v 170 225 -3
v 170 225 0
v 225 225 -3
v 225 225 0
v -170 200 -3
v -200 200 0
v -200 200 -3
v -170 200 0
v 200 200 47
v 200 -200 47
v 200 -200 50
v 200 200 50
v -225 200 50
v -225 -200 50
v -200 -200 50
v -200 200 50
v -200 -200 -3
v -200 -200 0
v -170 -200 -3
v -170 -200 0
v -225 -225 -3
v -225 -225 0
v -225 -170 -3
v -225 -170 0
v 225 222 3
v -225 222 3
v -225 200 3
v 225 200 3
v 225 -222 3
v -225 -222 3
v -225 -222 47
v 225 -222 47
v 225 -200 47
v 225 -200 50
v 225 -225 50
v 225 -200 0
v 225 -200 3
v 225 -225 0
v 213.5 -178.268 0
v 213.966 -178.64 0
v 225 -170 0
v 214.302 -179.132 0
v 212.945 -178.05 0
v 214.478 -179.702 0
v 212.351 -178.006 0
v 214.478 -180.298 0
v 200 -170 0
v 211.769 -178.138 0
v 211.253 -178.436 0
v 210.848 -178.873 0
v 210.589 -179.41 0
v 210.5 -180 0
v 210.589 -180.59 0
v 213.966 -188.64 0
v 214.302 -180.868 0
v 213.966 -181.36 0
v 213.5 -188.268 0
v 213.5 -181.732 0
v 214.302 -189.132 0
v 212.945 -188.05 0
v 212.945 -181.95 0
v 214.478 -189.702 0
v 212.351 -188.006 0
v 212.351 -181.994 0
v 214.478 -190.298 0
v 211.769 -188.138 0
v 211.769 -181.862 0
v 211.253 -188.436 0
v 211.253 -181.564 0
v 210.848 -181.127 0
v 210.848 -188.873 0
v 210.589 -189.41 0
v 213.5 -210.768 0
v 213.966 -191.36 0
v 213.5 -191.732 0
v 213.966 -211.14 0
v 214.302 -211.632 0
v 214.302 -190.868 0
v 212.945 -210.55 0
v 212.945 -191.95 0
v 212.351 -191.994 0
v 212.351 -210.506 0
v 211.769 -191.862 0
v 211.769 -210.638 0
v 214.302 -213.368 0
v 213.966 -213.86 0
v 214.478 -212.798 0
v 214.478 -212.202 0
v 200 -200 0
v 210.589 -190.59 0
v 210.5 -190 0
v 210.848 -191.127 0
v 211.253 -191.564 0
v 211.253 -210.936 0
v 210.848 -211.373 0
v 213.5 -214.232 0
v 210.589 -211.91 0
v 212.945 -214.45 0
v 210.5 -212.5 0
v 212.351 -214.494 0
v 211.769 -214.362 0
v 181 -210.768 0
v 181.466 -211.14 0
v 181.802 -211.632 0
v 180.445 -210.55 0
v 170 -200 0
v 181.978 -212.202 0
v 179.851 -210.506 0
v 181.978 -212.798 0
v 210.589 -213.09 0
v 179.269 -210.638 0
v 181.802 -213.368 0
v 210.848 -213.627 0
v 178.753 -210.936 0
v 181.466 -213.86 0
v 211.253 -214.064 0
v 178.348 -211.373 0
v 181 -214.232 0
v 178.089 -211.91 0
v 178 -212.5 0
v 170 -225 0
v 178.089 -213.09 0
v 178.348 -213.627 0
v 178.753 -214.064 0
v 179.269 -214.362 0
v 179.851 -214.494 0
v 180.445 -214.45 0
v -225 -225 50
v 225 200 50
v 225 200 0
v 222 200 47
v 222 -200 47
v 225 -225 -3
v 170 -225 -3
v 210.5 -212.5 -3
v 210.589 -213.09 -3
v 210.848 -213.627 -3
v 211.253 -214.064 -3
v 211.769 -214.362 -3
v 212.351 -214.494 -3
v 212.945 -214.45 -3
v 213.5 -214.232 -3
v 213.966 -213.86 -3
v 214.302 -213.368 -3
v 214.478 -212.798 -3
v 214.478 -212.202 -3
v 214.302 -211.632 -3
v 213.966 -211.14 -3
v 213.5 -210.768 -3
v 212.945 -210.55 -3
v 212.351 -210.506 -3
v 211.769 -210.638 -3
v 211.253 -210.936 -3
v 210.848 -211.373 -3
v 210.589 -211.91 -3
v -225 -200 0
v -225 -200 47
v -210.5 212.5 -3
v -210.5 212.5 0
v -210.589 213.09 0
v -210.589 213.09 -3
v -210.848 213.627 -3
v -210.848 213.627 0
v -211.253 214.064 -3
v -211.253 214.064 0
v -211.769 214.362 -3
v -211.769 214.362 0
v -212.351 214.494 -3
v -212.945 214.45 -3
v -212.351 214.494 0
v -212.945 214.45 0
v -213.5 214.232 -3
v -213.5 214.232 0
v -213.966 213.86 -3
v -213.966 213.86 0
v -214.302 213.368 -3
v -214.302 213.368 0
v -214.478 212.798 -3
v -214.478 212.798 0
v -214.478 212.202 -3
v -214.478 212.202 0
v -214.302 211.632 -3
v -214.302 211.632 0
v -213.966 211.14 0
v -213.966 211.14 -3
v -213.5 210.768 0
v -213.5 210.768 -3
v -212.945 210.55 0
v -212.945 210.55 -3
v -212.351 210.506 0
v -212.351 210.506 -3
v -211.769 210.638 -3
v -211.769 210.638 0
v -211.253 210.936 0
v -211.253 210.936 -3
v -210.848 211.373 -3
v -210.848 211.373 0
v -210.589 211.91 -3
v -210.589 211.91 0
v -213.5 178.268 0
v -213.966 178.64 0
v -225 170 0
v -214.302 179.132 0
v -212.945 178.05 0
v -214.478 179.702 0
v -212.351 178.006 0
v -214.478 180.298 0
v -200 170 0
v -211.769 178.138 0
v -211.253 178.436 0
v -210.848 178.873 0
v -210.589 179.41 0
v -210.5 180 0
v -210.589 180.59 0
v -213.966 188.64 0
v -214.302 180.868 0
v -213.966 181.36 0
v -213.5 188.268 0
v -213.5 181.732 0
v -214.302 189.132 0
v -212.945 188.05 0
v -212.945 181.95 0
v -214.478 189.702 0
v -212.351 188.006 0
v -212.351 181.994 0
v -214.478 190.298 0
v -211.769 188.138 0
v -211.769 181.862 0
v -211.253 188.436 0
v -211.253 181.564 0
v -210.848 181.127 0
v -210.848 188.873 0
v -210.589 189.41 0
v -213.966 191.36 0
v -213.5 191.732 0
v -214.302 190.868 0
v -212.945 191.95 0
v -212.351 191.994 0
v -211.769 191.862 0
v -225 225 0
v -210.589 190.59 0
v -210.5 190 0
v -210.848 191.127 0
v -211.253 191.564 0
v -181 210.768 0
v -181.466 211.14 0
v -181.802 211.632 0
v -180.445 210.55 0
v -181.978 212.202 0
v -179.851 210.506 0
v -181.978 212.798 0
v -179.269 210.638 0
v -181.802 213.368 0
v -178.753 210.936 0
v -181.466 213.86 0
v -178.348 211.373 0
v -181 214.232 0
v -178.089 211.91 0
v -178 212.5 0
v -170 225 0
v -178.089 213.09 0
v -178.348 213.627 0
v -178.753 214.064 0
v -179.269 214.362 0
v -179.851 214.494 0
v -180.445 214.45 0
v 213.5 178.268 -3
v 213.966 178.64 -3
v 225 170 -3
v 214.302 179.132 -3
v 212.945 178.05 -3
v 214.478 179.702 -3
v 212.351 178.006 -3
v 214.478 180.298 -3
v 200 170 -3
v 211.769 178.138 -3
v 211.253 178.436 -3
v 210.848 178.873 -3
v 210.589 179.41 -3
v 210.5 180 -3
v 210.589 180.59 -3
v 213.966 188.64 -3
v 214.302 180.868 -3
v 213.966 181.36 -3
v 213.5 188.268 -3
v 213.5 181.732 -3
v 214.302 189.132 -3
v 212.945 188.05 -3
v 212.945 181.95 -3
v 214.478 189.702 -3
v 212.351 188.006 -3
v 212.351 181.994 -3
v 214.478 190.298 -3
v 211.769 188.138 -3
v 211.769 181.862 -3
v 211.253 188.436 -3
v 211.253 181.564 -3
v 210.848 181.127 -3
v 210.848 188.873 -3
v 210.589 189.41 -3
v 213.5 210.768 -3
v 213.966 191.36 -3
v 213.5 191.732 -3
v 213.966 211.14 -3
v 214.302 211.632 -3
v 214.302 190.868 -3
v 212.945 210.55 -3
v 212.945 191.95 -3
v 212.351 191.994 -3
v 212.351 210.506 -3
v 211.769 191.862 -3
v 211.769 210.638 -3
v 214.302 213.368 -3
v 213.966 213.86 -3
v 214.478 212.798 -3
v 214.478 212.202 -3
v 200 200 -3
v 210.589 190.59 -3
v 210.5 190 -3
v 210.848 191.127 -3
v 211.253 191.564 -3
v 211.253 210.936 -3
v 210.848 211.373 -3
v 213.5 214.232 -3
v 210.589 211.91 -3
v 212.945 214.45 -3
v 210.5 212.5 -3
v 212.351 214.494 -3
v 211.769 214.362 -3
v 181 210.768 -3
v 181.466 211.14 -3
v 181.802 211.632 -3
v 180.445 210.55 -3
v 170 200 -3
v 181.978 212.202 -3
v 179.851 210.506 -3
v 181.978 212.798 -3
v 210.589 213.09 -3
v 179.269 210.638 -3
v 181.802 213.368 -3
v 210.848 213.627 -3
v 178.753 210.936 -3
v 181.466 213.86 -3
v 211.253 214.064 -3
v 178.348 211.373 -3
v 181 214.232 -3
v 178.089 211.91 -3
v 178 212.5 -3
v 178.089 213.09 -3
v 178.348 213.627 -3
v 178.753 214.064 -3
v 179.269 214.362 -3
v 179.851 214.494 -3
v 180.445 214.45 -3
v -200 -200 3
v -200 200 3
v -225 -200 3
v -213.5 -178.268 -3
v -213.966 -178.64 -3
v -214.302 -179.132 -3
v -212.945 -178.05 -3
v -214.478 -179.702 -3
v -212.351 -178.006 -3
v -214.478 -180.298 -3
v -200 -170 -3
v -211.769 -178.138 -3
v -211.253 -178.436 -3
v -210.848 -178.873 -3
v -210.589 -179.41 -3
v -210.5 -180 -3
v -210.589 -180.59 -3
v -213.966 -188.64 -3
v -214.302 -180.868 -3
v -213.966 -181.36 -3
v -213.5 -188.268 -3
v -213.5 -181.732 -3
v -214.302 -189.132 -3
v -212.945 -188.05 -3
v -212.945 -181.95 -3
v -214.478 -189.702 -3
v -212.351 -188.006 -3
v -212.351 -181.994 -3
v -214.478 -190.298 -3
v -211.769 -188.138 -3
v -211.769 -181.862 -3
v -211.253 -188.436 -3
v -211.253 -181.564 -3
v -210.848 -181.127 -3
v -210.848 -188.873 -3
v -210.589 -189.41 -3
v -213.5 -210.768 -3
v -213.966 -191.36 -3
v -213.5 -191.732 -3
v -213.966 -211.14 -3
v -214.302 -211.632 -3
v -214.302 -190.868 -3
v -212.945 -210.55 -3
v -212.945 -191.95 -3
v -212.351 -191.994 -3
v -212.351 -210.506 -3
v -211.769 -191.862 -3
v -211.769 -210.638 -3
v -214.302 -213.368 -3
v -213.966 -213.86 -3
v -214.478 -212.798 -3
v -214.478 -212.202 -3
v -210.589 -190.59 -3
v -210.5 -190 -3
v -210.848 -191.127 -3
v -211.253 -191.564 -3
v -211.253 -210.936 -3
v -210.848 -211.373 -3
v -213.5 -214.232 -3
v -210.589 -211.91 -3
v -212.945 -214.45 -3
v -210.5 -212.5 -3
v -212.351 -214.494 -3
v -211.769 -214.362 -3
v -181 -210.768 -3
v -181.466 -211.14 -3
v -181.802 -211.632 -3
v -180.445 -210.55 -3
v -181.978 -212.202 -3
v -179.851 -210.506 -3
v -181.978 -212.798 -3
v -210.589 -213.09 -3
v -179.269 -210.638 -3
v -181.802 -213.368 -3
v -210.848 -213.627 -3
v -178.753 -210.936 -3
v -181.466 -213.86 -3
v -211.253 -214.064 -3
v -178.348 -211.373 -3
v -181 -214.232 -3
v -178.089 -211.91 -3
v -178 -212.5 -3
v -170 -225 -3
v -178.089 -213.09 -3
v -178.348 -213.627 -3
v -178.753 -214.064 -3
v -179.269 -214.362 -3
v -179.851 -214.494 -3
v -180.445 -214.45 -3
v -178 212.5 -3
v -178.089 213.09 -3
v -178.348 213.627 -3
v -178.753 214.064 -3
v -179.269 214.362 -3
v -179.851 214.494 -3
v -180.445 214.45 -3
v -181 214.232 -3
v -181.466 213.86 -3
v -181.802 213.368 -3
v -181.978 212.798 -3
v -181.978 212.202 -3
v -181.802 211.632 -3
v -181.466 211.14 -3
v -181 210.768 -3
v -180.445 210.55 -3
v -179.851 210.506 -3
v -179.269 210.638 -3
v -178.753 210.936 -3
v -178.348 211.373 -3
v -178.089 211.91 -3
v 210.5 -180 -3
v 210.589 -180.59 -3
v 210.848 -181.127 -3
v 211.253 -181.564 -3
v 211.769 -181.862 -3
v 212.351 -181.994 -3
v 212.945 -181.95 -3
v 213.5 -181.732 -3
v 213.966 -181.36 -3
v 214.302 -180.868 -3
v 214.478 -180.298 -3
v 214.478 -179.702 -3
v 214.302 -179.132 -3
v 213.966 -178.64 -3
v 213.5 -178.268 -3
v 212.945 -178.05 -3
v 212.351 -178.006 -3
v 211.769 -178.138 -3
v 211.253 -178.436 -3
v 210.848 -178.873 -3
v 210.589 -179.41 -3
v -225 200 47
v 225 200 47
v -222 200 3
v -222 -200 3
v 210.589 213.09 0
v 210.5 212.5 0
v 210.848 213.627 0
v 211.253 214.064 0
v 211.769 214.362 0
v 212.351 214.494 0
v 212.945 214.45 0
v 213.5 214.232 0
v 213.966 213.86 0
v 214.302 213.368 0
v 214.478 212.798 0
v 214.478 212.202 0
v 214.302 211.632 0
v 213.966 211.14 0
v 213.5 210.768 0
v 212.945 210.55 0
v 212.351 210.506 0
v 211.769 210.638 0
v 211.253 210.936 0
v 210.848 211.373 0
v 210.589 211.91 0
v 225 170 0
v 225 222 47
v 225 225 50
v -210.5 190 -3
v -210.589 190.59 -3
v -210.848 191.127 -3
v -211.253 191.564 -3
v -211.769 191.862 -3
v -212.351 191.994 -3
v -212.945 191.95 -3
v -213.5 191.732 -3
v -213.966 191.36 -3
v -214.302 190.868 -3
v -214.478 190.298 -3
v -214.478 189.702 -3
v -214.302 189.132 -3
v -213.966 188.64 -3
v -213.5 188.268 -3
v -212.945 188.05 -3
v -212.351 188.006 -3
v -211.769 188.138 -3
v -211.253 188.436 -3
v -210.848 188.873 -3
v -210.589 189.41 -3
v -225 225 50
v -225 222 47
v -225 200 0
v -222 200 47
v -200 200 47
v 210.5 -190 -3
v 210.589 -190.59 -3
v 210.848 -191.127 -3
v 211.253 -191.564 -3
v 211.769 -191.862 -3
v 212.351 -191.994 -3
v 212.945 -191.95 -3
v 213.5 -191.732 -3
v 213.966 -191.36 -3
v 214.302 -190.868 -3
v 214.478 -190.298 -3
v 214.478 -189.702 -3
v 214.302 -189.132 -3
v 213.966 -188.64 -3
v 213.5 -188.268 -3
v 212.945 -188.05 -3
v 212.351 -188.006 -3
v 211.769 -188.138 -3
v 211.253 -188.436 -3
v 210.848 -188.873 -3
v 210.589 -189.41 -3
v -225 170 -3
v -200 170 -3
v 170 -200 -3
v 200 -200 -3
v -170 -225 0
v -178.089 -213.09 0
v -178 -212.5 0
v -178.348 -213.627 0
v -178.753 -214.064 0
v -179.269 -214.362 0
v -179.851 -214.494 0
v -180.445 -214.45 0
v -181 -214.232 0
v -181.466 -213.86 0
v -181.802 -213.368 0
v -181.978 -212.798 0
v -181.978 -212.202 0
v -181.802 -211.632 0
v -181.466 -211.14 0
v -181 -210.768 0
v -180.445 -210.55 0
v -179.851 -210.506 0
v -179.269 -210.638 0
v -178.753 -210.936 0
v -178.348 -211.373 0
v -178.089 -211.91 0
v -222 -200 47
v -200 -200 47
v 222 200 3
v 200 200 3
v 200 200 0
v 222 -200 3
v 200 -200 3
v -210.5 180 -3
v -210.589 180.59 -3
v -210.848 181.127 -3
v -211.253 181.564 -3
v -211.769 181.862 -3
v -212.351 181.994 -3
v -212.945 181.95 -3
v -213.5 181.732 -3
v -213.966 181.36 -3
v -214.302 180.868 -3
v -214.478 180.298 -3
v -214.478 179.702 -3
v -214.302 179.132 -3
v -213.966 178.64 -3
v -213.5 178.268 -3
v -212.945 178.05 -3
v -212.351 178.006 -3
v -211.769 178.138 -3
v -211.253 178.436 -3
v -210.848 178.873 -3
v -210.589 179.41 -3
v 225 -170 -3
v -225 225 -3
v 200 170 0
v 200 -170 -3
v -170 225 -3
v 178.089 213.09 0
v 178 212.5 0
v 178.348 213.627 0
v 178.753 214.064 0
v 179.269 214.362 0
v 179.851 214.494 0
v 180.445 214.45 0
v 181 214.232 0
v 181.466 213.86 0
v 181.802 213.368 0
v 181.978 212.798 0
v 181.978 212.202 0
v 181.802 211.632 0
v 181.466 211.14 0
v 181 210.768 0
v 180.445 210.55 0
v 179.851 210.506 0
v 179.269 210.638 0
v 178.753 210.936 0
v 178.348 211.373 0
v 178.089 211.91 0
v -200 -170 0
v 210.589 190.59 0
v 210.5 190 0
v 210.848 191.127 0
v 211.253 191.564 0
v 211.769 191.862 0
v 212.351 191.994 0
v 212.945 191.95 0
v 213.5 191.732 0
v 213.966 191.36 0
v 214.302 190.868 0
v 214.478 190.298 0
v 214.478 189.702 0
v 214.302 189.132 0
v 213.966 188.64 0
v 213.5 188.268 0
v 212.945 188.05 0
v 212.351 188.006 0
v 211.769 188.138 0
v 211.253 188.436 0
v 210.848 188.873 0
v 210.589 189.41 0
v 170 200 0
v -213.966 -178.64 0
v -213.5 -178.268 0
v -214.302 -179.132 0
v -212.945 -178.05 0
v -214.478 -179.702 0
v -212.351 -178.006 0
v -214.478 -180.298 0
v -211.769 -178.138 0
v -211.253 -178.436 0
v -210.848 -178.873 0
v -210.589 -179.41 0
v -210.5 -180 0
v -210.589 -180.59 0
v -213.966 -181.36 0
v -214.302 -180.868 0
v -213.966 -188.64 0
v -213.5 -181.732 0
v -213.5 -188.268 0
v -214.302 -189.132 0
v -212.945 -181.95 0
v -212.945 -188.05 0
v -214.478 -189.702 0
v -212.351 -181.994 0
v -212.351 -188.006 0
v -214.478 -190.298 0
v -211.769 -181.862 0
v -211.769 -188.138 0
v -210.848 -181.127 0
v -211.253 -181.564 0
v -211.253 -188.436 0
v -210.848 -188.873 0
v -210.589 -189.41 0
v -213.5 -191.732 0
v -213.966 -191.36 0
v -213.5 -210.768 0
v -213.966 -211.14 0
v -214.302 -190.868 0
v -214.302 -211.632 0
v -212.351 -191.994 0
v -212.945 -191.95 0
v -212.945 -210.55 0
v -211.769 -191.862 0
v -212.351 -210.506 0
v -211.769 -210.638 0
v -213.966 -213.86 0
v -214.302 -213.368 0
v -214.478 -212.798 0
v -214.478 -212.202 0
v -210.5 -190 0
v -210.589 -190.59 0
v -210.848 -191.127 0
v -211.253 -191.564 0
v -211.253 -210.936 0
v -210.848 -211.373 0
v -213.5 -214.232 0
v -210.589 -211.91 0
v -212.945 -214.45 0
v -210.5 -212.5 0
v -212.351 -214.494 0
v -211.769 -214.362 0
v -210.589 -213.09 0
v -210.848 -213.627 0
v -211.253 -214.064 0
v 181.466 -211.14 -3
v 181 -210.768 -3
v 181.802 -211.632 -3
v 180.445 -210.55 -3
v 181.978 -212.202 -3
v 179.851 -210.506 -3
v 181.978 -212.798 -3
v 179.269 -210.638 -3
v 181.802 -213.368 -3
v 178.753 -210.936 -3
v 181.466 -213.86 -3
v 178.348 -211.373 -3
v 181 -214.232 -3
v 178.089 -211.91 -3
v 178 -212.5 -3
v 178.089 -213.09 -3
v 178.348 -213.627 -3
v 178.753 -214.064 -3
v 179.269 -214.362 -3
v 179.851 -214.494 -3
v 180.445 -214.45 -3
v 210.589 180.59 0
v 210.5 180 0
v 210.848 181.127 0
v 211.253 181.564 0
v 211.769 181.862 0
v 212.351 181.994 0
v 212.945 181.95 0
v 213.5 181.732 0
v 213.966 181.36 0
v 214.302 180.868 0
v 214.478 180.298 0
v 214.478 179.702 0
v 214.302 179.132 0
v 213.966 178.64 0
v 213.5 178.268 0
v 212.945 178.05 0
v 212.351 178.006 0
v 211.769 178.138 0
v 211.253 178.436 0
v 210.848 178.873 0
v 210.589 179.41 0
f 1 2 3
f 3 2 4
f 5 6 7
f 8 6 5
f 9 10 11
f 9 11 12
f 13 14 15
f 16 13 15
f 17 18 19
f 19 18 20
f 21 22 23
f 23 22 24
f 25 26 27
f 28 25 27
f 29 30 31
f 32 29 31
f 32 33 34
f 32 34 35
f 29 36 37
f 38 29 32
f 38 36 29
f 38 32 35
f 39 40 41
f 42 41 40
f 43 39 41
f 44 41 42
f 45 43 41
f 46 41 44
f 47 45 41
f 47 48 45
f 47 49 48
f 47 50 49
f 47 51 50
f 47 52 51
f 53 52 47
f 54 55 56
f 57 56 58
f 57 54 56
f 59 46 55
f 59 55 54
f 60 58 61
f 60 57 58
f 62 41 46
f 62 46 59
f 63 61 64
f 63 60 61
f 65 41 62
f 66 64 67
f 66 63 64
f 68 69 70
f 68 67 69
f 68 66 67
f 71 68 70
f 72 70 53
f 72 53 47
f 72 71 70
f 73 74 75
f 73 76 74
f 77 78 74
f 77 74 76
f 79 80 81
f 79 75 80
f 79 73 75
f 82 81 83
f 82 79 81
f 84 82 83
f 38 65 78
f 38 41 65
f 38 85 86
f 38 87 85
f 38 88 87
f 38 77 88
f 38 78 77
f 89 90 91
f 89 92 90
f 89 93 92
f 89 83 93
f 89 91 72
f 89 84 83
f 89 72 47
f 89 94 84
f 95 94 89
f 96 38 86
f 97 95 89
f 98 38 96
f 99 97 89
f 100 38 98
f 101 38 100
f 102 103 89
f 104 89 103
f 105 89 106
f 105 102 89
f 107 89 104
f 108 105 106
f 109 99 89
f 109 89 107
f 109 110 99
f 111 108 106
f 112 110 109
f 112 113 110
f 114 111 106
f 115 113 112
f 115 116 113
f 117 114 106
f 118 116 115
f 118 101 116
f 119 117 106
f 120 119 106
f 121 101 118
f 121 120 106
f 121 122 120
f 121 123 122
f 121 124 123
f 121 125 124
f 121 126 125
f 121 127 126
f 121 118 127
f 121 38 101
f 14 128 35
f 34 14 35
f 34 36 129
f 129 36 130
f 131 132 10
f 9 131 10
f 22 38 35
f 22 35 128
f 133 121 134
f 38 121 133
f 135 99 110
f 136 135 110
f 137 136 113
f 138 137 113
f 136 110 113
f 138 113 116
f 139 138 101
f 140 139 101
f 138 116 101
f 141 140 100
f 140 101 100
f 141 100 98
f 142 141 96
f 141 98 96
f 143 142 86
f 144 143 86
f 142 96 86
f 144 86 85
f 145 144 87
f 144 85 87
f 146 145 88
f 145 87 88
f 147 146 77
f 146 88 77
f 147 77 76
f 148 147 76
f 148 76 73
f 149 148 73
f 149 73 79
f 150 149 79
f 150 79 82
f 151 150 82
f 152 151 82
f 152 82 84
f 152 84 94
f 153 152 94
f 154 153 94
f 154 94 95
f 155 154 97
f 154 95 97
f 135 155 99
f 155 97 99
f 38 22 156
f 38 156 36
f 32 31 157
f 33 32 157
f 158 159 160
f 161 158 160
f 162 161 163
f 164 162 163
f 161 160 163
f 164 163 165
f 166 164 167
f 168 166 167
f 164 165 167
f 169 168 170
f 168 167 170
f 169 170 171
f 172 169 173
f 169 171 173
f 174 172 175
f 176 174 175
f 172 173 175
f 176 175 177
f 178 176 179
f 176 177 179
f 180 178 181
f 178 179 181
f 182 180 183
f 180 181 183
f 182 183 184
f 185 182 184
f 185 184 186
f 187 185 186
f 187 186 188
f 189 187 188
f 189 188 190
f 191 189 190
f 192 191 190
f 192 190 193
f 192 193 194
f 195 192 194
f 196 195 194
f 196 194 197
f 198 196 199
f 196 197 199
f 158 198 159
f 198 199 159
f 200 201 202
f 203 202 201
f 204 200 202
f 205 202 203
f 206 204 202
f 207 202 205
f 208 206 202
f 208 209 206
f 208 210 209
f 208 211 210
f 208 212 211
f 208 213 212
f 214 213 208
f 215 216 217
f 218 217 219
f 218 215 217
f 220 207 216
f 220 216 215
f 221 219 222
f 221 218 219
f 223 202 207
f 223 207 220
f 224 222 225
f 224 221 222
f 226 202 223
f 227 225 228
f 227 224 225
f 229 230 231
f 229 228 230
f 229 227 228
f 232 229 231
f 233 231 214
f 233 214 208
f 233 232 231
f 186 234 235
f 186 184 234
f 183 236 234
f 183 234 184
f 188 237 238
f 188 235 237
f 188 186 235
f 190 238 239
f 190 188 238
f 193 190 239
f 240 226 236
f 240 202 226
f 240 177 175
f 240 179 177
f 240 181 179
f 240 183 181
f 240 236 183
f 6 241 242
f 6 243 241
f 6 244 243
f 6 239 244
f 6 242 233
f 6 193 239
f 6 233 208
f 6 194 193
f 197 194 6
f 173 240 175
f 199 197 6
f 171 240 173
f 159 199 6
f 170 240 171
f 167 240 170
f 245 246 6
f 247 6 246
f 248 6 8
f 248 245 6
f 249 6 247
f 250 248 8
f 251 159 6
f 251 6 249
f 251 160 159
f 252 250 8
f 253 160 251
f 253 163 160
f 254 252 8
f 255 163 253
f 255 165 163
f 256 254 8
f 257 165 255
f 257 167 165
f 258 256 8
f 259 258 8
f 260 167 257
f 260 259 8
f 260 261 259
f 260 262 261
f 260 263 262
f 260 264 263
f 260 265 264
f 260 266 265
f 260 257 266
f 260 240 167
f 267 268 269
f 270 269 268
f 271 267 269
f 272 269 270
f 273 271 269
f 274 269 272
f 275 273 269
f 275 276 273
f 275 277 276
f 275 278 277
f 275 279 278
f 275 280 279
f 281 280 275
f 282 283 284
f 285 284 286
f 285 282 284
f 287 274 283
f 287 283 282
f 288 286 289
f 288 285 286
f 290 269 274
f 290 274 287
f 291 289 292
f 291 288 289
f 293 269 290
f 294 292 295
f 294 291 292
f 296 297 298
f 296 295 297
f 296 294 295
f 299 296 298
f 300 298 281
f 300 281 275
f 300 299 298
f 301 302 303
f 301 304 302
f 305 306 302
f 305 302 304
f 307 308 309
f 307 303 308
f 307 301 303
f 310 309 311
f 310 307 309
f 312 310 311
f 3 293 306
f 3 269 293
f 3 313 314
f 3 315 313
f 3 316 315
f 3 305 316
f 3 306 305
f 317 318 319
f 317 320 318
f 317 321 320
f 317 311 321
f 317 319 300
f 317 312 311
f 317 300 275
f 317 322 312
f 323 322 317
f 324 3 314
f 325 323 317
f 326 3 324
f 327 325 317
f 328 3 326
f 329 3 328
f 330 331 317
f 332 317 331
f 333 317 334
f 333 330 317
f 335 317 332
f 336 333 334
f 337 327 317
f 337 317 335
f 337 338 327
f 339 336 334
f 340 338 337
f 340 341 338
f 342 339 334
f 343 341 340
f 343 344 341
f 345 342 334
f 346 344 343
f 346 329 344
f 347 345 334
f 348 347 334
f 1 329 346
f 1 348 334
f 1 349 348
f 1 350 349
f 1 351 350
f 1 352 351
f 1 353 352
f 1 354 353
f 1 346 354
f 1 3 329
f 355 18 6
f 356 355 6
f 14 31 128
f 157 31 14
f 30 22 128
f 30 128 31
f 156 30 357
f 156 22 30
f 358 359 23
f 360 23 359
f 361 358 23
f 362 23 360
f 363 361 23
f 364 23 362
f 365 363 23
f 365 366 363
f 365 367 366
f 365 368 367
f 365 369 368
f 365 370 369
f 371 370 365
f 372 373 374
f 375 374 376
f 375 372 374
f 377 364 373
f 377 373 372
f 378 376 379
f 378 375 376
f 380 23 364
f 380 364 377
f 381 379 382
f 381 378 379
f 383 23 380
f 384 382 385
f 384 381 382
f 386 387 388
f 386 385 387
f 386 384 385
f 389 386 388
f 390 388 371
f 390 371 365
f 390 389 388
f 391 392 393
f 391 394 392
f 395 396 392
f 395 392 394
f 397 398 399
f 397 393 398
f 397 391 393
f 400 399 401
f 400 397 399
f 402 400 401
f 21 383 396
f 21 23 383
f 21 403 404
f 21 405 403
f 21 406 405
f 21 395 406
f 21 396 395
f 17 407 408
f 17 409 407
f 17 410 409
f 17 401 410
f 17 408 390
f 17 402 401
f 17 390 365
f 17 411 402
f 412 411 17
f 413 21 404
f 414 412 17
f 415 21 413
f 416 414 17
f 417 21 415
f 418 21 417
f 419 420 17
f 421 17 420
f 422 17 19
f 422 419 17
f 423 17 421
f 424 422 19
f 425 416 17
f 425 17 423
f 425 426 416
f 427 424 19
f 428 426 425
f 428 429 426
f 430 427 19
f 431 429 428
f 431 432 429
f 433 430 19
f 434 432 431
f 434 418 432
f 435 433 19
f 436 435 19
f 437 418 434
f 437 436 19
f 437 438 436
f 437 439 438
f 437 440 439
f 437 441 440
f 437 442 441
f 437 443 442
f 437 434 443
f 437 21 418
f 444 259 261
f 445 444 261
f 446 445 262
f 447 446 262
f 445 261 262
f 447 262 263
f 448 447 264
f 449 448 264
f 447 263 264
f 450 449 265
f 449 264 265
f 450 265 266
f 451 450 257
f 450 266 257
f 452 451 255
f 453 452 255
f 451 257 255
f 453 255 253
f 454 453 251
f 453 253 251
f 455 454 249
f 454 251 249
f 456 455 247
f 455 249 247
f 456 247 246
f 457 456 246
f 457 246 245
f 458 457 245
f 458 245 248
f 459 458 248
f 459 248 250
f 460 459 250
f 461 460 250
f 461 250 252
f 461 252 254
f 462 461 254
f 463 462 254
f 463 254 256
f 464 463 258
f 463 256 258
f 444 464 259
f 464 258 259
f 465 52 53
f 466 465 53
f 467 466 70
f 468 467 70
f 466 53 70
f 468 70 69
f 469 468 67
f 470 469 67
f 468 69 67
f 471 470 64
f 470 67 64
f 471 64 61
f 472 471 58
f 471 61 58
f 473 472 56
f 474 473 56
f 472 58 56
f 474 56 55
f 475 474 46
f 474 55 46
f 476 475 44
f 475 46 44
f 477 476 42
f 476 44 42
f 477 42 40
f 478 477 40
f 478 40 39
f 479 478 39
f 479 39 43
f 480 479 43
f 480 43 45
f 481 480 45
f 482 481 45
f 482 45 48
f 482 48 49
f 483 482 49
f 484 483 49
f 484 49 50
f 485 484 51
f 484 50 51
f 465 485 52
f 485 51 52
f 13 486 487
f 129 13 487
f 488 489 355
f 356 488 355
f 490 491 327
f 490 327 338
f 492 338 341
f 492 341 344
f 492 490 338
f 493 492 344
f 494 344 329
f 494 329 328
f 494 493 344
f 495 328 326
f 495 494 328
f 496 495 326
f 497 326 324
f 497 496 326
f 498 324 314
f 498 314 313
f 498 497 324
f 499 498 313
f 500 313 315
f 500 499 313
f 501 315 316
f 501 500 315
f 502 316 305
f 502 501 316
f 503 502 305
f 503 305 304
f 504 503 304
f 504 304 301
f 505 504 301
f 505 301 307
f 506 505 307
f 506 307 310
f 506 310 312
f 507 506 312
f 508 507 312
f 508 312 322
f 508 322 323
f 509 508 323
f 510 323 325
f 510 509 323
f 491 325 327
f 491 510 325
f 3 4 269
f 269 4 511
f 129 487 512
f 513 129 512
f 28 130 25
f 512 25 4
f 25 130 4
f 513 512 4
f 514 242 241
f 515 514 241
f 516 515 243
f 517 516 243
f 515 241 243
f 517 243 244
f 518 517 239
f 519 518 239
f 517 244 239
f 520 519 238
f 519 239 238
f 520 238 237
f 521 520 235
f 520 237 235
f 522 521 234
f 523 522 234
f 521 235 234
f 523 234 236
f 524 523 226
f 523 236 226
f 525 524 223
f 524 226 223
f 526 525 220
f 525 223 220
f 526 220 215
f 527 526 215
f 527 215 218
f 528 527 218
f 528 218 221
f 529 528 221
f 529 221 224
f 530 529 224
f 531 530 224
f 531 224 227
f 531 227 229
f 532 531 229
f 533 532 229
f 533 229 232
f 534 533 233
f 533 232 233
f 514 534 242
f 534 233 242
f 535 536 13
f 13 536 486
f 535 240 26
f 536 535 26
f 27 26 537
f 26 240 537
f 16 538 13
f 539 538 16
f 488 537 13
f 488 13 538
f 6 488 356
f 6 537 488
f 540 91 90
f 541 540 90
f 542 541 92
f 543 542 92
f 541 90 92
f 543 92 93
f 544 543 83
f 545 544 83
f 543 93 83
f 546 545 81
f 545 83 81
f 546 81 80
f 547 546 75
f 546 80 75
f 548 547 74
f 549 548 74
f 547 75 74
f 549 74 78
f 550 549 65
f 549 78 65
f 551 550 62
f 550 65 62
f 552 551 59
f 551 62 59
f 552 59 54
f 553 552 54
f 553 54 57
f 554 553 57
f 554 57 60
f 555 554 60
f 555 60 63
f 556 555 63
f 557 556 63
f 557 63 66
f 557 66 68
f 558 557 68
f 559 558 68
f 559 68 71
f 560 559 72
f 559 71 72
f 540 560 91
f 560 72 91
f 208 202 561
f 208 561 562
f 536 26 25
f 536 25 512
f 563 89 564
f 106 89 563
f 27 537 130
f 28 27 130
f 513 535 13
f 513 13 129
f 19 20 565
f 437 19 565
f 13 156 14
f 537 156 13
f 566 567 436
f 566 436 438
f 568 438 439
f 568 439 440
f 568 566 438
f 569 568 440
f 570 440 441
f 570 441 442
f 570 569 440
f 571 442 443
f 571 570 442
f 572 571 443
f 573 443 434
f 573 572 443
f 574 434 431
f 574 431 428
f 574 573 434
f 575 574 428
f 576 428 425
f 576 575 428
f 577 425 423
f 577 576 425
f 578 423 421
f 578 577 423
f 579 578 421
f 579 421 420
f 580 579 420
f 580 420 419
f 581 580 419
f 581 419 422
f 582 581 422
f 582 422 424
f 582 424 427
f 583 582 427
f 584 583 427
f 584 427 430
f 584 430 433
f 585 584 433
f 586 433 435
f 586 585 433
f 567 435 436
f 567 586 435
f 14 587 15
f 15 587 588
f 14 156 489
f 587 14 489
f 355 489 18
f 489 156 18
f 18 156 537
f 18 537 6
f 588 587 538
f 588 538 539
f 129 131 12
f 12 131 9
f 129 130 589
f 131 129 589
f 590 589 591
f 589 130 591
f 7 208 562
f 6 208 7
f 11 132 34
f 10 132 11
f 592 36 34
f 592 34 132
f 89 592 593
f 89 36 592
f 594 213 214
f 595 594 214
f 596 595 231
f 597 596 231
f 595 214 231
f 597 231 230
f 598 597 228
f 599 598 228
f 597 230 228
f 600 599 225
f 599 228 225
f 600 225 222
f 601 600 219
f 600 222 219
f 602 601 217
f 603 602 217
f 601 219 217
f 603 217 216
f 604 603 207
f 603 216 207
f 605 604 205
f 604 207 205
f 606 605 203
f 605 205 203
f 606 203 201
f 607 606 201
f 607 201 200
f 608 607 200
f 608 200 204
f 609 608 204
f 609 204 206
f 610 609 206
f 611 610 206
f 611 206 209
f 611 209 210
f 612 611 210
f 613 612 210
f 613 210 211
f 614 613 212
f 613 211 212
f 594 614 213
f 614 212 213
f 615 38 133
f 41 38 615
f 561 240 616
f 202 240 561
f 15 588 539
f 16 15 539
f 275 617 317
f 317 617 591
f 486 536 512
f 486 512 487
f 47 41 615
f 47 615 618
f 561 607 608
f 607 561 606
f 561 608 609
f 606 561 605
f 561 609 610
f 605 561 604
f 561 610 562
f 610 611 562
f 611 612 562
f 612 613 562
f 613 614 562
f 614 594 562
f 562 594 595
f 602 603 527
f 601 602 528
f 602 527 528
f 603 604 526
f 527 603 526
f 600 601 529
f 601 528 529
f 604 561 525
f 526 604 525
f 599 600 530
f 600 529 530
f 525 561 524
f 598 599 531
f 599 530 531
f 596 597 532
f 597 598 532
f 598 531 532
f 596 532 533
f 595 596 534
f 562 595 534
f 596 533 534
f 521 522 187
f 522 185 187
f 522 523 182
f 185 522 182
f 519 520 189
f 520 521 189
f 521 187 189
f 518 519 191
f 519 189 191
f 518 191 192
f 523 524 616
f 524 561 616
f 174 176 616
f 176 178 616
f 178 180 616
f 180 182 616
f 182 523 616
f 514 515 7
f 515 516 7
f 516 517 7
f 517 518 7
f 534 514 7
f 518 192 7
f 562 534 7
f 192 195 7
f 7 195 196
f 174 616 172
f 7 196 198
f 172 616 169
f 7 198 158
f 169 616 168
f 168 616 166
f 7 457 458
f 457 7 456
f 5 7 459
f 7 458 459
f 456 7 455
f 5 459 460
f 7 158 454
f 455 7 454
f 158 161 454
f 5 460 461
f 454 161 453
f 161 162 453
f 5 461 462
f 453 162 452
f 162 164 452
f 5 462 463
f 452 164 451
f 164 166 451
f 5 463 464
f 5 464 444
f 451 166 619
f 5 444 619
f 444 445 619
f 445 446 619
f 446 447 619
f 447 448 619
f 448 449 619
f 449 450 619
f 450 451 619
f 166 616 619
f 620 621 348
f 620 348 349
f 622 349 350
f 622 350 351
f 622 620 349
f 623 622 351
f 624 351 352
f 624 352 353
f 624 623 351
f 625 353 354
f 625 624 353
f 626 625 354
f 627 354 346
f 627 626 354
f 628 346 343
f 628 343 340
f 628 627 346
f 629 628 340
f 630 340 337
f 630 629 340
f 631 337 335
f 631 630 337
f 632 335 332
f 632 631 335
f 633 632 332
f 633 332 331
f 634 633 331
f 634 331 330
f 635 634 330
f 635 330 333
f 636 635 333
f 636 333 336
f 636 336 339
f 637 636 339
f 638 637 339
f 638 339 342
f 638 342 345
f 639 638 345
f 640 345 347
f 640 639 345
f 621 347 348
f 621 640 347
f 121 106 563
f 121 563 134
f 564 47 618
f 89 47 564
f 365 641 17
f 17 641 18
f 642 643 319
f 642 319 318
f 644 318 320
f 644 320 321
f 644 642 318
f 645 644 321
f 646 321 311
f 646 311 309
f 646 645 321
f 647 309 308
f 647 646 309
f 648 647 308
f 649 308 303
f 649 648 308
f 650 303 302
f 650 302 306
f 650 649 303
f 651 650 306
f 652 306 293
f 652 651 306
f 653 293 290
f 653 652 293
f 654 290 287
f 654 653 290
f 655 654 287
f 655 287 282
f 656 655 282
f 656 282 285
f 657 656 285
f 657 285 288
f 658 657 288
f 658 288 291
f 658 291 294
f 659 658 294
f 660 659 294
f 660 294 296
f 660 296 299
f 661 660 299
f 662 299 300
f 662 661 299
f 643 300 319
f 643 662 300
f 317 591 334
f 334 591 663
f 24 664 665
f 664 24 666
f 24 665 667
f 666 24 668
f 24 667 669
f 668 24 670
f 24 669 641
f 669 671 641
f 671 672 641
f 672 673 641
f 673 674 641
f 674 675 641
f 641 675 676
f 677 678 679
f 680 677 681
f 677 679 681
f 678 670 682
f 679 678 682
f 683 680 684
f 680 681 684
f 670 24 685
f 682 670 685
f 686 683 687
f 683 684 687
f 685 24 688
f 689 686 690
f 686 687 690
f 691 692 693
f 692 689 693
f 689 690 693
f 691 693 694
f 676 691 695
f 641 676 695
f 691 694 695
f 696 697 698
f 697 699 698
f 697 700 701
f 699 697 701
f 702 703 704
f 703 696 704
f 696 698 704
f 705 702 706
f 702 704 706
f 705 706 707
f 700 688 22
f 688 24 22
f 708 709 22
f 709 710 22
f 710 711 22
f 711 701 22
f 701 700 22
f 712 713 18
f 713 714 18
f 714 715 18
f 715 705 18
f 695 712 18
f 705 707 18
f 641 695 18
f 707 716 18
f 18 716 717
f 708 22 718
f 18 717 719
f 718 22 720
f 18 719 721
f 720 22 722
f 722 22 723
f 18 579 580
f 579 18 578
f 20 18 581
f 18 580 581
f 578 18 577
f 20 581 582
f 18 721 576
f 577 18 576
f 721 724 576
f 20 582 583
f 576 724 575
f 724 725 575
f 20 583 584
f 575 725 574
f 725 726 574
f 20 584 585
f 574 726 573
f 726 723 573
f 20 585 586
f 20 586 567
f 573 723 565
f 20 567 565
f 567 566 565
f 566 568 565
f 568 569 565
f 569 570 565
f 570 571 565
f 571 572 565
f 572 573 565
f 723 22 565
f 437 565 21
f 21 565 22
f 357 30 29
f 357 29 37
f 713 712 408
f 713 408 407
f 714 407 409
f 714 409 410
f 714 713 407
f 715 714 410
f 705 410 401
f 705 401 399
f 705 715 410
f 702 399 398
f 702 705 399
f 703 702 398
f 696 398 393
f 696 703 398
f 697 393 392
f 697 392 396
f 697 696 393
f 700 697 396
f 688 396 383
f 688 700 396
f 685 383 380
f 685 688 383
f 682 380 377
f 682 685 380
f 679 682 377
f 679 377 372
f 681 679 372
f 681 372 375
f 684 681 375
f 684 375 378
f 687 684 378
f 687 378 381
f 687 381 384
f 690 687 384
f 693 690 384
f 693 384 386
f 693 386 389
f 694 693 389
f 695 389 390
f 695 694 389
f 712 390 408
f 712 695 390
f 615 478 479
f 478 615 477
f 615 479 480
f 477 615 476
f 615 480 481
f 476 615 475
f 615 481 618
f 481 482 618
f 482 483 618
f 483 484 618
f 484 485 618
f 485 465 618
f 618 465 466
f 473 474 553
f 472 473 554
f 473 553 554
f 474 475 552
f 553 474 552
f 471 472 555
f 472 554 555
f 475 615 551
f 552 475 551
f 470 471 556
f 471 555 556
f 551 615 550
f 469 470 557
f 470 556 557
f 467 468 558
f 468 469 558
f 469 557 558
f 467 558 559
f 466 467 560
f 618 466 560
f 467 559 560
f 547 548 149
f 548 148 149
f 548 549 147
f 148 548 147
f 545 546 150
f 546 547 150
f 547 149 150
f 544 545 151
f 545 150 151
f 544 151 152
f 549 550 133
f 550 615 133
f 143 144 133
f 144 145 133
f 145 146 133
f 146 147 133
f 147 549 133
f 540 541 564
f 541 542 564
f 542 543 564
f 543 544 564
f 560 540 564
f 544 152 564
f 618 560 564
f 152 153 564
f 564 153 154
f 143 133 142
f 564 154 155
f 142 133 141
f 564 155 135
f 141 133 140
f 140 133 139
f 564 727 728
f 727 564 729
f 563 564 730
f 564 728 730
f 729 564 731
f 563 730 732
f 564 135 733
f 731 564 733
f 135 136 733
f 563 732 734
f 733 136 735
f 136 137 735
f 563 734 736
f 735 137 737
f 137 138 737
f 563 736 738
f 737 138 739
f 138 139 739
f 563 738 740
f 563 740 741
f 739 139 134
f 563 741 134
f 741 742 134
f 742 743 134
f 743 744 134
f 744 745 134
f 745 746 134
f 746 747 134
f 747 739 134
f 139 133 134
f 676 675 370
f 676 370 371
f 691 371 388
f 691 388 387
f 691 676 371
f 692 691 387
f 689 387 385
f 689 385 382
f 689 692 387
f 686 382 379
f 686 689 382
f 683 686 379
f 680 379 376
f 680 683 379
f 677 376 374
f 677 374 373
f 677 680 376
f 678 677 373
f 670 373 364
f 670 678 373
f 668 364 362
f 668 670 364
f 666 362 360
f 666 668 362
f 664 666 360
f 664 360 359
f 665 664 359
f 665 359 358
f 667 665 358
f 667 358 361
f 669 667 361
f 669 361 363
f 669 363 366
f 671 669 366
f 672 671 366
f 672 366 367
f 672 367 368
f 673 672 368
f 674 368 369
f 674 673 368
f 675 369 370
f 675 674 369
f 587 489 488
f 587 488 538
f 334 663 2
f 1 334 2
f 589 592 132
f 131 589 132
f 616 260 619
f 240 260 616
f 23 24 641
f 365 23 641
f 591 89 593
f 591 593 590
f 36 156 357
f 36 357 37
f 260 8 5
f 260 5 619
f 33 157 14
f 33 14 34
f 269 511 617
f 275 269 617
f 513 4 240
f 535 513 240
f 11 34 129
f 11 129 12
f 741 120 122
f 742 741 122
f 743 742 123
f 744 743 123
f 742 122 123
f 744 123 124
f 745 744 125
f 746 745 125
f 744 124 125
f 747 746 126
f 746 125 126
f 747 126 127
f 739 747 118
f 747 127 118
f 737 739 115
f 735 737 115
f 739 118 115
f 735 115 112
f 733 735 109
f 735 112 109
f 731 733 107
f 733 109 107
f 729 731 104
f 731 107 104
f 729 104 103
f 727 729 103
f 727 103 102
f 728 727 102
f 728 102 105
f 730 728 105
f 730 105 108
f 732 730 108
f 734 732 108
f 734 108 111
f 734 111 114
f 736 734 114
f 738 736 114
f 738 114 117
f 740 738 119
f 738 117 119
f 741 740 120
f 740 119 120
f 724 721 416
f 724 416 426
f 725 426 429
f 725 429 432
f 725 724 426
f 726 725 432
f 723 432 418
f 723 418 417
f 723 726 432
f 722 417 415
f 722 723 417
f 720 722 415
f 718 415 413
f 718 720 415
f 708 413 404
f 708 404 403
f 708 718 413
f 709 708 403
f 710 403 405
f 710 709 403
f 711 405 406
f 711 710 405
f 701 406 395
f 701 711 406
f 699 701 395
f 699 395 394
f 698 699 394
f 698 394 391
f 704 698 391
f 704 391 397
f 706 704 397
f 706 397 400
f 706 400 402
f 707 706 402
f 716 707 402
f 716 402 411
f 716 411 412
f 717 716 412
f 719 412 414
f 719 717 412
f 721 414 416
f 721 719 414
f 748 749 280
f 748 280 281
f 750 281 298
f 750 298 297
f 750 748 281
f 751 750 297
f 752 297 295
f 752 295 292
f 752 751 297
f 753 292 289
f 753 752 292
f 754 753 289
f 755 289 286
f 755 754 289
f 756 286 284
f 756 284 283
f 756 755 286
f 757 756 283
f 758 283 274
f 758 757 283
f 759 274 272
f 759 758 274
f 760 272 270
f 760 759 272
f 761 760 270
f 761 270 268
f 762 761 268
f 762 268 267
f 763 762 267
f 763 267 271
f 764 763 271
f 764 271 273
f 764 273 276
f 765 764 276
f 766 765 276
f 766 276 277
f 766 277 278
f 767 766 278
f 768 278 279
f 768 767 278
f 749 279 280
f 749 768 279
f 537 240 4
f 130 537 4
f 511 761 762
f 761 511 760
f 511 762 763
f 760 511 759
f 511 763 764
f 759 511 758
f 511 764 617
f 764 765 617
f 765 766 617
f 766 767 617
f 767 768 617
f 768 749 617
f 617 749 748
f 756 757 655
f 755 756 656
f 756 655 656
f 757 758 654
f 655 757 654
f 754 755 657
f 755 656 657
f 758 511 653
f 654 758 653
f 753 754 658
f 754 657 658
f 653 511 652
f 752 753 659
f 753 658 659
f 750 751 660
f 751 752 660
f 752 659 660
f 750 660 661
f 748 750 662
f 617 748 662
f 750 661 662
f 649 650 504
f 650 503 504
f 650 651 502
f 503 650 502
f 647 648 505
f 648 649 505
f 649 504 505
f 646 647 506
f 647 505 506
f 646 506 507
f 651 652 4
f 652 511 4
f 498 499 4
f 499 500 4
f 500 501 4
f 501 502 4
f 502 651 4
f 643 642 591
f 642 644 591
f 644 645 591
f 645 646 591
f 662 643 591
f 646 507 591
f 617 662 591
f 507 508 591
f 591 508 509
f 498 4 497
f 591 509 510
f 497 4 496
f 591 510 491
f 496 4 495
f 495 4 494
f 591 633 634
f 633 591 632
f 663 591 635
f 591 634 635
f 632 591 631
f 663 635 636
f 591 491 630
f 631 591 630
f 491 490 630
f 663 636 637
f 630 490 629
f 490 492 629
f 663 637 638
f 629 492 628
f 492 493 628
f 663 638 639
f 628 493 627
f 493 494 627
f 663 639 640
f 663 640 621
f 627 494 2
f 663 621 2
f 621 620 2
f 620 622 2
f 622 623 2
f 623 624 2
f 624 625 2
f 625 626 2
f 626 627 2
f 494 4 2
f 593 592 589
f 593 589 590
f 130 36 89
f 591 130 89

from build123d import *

# Parameters (mm, degrees)
F0_W      = 25
F0_H      = 400
F1_DEPTH  = 50
F2_DEPTH  = 50
F3_W      = 22
F3_H      = 44
F4_DEPTH  = 450
F6_W      = 22
F6_H      = 44
F7_DEPTH  = 400
F9_R      = 2
F10_DEPTH = 3


with BuildPart() as f1:
    # F0 (on Top) → F1 (new body)
    with BuildSketch(Plane.XY):
        with Locations((-212.5, 0)):
            Rectangle(F0_W, F0_H)
    extrude(amount=F1_DEPTH)

    # F6 (on face) → F7 (cut, through all)
    with BuildSketch(Plane.XZ.offset(200)):
        with Locations((-211, 25)):
            Rectangle(F6_W, F6_H)
    extrude(amount=-F7_DEPTH, mode=Mode.SUBTRACT)


with BuildPart() as f2:
    # F0 (on Top) → F2 (new body)
    with BuildSketch(Plane.XY):
        Polygon((200, 200), (225, 200), (225, 225), (-225, 225), (-225, 200), (-200, 200), align=None)
    extrude(amount=F2_DEPTH)

    # F3 (on face) → F4 (cut, through all)
    with BuildSketch(Plane(origin=(-225, 0, 0), x_dir=(0, -1, 0), z_dir=(-1, 0, 0))):
        with Locations((-211, 25)):
            Rectangle(F3_W, F3_H)
    extrude(amount=-F4_DEPTH, mode=Mode.SUBTRACT)


with BuildPart() as f5_1:
    # F5: instance of F2
    add(f2.part.mirror(Plane.XZ))


with BuildPart() as f8_1:
    # F8: instance of F1
    add(f1.part.mirror(Plane.YZ))


with BuildPart() as f10:
    # F9 (on face) → F10 (new body)
    with BuildSketch(Plane(origin=(0, 0, 0), x_dir=(1, 0, 0), z_dir=(0, 0, -1))):
        Polygon((-170, 225), (-225, 225), (-225, 170), (-200, 170), (-200, 200), (-170, 200), align=None)
        with Locations((-212.5, 180)):
            Circle(F9_R, mode=Mode.SUBTRACT)
        with Locations((-212.5, 190)):
            Circle(F9_R, mode=Mode.SUBTRACT)
        with Locations((-212.5, 212.5)):
            Circle(F9_R, mode=Mode.SUBTRACT)
        with Locations((-180, 212.5)):
            Circle(F9_R, mode=Mode.SUBTRACT)
    extrude(amount=F10_DEPTH)


with BuildPart() as f11_1:
    # F11: instance of F10
    add(f10.part.mirror(Plane.XZ))


with BuildPart() as f12_1:
    # F12: instance of F10
    add(f10.part.mirror(Plane.YZ))


with BuildPart() as f12_2:
    # F12: instance of F11_1
    add(f11_1.part.mirror(Plane.YZ))


solid = Compound([f1.part, f2.part, f5_1.part, f8_1.part, f10.part, f11_1.part, f12_1.part, f12_2.part])
